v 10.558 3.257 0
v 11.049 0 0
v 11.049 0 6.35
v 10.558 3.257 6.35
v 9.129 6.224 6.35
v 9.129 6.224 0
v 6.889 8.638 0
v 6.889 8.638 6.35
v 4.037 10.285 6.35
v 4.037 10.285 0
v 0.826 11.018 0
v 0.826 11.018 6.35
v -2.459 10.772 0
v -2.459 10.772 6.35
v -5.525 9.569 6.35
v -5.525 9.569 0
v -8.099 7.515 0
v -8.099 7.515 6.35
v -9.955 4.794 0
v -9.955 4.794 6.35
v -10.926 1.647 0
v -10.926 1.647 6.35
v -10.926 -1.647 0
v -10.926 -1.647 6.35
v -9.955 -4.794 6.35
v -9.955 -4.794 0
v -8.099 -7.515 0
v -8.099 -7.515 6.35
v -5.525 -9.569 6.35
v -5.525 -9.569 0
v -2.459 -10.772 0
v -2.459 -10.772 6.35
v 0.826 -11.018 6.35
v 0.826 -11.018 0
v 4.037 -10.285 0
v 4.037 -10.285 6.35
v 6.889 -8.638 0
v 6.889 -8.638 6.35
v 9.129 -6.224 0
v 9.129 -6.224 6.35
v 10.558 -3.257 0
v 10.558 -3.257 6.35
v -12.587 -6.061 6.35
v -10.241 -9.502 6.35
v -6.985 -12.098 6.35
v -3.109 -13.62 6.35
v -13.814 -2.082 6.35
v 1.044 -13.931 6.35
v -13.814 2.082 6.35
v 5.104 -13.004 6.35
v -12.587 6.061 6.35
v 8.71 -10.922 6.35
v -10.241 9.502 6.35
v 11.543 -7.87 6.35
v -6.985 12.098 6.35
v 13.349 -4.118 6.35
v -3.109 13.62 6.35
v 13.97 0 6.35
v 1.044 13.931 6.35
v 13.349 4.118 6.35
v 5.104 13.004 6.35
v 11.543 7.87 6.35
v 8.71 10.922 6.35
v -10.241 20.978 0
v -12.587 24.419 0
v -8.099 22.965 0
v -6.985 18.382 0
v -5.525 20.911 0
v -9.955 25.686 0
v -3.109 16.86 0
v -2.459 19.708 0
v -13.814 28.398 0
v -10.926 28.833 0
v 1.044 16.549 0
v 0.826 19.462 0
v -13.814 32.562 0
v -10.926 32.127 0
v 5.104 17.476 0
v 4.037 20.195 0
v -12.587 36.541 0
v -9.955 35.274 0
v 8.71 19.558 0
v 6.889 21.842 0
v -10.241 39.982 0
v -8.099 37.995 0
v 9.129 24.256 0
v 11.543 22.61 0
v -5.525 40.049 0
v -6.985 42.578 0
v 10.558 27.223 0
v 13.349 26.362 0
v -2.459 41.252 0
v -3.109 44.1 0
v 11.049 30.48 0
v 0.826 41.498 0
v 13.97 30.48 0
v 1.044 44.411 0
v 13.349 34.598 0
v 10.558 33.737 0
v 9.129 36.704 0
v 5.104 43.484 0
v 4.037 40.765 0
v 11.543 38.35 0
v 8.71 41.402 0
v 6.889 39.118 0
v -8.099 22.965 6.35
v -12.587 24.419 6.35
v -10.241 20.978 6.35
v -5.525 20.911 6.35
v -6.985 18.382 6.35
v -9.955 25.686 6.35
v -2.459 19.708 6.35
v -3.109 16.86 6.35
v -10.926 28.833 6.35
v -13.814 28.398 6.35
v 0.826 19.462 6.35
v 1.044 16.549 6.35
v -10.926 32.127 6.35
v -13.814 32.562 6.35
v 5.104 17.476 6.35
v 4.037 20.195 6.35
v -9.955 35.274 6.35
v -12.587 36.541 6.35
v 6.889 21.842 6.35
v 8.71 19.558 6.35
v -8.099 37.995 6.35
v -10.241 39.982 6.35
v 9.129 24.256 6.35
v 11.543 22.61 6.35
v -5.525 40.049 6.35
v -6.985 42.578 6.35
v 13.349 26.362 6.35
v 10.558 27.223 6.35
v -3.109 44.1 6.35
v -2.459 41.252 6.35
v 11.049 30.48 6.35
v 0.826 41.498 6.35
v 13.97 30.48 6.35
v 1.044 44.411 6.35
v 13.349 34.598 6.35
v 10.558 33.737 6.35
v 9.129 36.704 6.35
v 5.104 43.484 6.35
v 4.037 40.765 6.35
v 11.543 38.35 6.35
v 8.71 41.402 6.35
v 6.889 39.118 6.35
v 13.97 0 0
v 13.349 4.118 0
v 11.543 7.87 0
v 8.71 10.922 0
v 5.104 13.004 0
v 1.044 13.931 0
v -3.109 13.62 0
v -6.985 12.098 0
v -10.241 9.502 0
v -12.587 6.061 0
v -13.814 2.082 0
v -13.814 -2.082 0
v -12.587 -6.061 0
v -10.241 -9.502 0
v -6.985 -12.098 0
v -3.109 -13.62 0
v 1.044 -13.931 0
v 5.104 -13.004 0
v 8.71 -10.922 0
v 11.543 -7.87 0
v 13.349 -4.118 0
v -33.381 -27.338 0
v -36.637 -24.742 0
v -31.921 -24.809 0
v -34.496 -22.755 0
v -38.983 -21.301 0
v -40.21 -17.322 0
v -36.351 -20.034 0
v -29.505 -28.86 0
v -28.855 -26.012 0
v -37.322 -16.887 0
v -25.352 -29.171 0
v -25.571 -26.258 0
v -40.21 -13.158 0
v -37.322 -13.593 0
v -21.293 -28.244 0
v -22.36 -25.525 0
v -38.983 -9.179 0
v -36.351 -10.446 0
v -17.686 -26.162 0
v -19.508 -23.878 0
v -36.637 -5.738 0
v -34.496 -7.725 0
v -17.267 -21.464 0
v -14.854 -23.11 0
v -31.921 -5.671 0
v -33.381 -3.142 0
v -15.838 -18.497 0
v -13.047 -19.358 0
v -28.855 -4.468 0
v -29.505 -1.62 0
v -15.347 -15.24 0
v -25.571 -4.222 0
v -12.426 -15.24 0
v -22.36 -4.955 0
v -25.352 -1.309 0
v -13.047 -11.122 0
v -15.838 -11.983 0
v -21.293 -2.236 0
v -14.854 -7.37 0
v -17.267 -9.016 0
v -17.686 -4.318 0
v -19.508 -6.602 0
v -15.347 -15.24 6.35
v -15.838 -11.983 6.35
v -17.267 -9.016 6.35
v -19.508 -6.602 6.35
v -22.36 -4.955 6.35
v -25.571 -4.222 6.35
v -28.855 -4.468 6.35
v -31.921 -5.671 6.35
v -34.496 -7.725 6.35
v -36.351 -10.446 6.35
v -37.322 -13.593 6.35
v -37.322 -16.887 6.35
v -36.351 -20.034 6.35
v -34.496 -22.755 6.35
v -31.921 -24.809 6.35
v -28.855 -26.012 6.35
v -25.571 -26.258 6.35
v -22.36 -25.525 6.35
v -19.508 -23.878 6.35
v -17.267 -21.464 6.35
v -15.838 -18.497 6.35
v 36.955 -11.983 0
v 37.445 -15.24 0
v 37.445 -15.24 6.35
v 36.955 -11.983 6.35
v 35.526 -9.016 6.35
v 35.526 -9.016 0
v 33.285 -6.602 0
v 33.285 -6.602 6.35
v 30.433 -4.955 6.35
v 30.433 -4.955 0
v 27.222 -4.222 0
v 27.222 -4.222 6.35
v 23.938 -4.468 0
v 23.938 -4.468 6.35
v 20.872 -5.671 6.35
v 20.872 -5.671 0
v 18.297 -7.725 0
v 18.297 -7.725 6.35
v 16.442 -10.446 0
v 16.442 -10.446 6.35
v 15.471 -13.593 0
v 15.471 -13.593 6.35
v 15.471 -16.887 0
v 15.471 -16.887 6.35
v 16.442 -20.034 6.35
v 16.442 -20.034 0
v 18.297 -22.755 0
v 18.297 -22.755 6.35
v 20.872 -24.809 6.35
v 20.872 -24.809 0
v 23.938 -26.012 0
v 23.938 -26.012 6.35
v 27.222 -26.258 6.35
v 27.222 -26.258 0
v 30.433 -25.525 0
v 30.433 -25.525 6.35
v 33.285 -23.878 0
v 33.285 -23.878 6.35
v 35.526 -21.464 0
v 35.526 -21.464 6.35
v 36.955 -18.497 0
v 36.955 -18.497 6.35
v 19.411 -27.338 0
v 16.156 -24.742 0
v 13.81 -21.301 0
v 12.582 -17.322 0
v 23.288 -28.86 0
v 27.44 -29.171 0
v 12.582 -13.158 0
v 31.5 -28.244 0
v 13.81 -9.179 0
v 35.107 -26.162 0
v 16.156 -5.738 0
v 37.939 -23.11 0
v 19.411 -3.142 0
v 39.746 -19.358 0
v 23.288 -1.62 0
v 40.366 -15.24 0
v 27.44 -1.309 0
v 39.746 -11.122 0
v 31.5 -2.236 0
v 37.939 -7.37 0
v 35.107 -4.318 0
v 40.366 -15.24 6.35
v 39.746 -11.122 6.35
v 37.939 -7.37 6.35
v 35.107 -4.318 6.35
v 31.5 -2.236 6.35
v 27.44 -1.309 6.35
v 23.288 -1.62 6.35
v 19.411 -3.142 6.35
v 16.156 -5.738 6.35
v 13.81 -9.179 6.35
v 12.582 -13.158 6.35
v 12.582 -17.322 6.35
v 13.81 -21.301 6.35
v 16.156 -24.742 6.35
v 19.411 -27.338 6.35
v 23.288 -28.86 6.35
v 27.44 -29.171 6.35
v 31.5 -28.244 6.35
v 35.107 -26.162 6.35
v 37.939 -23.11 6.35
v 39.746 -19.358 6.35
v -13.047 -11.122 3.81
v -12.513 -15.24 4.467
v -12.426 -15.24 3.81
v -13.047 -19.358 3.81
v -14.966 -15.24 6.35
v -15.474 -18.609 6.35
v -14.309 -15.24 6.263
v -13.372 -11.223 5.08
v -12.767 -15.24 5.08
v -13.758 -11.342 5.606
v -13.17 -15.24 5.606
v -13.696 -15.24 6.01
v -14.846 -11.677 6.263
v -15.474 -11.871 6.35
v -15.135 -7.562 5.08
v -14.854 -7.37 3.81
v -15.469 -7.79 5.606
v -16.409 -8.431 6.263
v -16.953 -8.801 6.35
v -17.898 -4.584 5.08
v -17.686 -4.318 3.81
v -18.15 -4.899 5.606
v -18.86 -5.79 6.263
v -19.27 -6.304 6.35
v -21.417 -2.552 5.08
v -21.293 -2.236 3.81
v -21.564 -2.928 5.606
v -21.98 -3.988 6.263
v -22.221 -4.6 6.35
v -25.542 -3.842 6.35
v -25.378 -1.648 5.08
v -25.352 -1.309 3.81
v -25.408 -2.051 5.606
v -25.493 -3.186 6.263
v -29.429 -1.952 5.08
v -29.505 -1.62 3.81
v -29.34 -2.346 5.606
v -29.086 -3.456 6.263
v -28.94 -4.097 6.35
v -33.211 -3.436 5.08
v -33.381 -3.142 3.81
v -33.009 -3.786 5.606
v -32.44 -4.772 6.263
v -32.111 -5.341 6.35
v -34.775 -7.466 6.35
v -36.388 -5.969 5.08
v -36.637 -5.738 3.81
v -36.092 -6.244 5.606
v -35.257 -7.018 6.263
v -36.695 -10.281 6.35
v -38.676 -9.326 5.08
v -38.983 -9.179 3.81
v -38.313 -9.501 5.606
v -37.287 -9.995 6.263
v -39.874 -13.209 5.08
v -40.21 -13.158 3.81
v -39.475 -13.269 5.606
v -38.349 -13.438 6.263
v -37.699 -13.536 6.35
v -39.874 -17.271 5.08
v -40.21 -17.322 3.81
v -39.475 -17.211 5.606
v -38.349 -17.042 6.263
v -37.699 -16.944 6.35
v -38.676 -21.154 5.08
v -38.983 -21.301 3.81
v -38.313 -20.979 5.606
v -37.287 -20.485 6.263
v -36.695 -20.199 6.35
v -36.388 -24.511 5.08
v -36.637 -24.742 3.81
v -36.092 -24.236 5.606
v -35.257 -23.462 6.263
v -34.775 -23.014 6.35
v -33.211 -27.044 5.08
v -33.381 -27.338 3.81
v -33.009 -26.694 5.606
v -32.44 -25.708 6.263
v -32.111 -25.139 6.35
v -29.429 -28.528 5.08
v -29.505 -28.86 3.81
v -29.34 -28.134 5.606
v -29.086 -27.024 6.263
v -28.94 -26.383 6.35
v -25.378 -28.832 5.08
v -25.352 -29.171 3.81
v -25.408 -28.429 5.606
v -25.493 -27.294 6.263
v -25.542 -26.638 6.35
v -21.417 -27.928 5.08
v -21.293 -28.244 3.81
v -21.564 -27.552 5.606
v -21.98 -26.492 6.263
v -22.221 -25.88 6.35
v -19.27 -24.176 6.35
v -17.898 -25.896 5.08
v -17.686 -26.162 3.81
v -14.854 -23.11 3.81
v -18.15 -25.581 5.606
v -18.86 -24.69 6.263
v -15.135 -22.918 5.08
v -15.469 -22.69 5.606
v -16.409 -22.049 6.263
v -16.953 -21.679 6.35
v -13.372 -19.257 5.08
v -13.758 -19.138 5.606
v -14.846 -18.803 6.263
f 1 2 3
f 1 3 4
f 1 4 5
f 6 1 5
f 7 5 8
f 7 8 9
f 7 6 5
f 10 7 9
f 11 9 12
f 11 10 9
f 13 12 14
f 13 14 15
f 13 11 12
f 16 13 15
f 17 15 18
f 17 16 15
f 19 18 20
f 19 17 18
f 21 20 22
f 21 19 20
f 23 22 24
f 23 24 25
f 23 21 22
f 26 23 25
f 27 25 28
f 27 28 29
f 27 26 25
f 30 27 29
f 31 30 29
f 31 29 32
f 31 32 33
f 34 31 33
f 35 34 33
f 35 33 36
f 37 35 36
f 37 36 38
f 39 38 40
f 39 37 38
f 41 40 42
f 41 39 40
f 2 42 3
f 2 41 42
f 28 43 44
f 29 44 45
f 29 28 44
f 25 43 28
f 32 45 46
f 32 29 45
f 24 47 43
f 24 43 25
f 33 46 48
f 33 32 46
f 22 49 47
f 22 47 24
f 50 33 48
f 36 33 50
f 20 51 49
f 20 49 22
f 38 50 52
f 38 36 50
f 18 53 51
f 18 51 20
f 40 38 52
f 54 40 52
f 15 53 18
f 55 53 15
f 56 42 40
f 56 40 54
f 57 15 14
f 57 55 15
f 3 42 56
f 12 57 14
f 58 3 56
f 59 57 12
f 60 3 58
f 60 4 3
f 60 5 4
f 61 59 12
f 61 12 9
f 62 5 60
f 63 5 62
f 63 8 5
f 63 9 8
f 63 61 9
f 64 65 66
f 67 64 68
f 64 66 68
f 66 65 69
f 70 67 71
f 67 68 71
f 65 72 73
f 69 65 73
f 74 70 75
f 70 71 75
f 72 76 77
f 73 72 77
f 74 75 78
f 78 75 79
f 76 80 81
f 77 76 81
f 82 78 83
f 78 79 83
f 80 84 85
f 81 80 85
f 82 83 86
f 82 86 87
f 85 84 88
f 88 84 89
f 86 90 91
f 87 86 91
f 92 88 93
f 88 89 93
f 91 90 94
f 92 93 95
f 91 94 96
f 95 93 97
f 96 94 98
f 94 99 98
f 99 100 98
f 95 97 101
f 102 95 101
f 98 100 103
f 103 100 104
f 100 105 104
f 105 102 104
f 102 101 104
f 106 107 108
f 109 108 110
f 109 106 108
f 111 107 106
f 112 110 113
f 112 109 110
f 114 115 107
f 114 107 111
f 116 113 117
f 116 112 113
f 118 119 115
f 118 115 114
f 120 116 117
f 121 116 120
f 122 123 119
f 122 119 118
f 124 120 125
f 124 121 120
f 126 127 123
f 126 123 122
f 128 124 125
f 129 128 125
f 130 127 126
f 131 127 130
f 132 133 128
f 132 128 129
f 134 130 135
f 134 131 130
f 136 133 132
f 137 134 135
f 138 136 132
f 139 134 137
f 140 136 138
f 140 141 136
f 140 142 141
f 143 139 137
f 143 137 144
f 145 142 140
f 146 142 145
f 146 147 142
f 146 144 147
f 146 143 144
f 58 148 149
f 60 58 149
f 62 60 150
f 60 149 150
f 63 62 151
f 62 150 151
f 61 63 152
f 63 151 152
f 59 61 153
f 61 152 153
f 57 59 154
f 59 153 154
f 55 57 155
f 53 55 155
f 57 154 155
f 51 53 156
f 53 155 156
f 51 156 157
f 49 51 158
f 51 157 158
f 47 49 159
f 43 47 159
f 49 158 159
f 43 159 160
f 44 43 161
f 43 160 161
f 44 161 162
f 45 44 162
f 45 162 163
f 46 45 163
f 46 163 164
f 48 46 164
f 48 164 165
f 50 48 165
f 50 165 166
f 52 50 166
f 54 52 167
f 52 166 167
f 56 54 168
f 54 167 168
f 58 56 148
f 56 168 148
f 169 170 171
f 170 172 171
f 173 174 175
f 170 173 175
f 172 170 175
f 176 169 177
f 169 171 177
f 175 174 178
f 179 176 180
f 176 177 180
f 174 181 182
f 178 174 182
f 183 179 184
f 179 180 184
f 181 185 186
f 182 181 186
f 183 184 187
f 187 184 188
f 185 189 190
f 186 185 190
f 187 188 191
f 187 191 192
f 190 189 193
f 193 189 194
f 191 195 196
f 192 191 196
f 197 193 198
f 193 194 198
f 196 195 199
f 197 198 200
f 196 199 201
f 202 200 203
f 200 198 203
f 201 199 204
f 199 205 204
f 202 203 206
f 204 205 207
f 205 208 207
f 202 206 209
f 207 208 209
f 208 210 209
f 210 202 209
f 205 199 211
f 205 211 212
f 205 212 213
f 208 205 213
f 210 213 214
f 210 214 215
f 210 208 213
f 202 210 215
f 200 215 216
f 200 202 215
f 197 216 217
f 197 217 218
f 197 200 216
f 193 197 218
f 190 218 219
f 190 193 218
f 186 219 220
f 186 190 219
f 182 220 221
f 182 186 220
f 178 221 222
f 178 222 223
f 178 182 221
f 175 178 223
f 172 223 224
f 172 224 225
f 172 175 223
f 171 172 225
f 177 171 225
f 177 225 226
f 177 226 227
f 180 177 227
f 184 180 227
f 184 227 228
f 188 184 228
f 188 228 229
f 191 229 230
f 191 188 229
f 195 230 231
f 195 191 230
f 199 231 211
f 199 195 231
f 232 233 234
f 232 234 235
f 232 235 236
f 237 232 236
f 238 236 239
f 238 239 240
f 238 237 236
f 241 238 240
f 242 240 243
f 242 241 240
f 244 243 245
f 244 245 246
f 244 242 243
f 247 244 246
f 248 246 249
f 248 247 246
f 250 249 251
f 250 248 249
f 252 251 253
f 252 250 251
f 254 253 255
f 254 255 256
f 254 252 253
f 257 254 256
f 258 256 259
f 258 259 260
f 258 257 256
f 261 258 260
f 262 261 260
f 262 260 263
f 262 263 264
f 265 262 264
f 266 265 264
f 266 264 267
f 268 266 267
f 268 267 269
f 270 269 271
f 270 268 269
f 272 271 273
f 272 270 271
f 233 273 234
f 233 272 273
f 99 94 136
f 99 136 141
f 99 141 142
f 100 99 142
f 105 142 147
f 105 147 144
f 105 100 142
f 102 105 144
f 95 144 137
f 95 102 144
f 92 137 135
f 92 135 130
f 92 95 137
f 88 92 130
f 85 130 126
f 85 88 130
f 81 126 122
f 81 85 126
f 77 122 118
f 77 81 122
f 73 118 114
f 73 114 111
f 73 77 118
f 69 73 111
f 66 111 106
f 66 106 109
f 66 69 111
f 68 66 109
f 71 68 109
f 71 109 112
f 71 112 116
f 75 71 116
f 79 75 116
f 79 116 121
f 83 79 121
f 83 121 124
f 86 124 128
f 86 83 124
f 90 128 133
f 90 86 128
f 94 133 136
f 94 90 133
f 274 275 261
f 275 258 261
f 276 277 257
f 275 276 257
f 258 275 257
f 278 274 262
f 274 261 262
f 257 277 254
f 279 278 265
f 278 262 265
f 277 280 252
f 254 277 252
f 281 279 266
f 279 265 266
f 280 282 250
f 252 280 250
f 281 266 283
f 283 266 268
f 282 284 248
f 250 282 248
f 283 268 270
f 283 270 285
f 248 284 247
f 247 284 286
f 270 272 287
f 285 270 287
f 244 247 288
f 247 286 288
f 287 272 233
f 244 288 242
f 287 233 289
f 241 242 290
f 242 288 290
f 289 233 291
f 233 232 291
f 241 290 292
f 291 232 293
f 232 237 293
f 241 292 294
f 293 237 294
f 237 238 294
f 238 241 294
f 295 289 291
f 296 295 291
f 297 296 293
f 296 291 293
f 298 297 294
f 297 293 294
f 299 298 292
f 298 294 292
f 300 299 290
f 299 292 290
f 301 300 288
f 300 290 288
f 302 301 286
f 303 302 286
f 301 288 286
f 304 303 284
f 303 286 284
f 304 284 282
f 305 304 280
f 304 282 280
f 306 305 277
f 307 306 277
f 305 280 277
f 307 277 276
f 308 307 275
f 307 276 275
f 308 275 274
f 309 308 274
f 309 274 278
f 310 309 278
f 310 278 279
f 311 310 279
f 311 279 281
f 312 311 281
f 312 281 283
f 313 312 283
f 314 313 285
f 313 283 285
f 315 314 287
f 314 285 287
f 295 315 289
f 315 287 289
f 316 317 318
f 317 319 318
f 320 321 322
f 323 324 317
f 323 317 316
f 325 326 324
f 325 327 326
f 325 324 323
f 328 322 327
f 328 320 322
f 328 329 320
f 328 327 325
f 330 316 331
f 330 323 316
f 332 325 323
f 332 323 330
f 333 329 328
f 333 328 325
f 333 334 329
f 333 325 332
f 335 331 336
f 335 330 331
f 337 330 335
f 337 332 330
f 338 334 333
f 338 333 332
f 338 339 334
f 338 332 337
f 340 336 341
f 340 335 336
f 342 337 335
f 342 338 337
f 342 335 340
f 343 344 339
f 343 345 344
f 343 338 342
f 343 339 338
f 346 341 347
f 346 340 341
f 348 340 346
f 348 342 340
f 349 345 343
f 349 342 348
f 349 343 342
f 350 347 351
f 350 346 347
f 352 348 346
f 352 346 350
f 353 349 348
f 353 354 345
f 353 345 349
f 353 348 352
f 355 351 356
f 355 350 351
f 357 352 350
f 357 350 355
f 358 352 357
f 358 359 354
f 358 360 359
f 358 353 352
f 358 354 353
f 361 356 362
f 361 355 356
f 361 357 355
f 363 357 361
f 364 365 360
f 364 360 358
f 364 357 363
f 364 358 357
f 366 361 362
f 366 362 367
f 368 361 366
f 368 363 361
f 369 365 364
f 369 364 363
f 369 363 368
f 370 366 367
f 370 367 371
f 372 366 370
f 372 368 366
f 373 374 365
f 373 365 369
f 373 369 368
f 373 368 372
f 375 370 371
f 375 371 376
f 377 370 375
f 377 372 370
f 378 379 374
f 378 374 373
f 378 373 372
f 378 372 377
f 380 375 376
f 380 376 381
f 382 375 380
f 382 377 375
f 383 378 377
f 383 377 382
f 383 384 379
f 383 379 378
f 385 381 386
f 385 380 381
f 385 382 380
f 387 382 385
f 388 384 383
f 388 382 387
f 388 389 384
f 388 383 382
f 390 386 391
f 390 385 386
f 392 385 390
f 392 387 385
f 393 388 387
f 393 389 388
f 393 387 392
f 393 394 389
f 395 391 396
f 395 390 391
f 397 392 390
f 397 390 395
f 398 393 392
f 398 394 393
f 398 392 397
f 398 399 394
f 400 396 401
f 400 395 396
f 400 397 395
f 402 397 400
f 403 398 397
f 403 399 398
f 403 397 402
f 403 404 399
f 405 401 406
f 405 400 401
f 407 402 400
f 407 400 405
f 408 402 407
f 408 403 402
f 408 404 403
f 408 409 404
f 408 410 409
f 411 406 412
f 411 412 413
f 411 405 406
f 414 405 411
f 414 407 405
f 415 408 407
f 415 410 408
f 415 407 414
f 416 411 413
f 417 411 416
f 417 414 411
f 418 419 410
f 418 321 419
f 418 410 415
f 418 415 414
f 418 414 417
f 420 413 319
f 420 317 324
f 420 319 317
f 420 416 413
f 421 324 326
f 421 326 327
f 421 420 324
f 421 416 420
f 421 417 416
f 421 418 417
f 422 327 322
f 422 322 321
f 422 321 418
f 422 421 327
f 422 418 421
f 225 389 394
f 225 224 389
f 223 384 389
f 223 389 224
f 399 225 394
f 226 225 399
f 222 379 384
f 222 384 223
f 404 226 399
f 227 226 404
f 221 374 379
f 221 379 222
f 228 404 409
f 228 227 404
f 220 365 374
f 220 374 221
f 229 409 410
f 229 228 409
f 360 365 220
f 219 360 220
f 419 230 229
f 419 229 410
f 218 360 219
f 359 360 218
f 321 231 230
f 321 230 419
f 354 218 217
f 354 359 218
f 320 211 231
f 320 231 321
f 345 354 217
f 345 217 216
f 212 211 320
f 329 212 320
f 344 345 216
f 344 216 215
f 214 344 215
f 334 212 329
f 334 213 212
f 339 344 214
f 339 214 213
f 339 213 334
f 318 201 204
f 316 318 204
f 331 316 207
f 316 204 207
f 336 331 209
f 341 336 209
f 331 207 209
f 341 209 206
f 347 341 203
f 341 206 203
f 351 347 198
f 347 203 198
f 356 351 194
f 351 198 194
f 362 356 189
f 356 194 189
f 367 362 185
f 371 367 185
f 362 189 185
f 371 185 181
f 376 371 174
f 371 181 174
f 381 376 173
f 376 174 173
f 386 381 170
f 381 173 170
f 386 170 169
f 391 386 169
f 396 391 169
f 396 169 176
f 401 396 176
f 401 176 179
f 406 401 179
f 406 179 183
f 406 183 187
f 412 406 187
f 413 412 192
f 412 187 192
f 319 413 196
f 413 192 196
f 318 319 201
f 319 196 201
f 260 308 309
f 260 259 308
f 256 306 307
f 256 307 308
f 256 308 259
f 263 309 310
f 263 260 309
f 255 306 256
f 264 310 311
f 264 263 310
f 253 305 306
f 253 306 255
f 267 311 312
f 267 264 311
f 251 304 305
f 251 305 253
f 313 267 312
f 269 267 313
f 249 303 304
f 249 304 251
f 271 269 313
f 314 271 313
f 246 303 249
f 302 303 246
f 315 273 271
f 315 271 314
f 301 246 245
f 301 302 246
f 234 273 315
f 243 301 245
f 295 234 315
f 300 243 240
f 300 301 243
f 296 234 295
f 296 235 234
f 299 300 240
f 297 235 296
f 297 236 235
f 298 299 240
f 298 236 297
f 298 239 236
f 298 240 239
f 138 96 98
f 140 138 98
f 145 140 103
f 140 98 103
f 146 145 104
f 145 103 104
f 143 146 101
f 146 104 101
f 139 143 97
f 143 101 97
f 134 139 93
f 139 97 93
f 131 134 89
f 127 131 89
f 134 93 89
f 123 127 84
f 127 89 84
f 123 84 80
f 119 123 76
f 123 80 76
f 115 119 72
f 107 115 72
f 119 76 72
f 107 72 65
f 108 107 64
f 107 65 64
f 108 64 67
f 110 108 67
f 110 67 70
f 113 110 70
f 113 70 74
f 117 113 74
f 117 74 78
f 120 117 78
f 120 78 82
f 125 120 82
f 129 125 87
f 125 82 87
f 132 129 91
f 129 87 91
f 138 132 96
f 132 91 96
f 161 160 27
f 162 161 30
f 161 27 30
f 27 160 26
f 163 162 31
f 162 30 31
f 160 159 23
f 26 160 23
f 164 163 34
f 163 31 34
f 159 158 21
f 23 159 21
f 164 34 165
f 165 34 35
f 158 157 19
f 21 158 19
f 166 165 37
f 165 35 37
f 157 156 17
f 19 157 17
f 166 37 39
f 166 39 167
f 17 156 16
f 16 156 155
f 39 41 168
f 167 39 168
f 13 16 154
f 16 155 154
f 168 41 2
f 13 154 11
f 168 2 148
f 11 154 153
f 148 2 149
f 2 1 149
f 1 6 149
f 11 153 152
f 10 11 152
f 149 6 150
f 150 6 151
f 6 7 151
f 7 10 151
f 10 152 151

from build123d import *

# Parameters (mm, degrees)
F0_R     = 13.97
F0_R_2   = 11.049
F2_DEPTH = 6.35
F4_R     = 2.54


# Not quite as in the source:
# - a feature of the source that left no trace in its solid (it failed there, or was rolled back) is left out


with BuildPart() as f2:
    # F0 (on Top) → F2 (new body)
    with BuildSketch(Plane.XY):
        with Locations((0, 30.48)):
            Circle(F0_R)
        with Locations((0, 30.48)):
            Circle(F0_R_2, mode=Mode.SUBTRACT)
    extrude(amount=F2_DEPTH)


with BuildPart() as f2b:
    # F0 (on Top) → F2, piece 2 (new body)
    with BuildSketch(Plane.XY):
        Circle(F0_R)
        Circle(F0_R_2, mode=Mode.SUBTRACT)
    extrude(amount=F2_DEPTH)


with BuildPart() as f2c:
    # F0 (on Top) → F2, piece 3 (new body)
    with BuildSketch(Plane.XY):
        with Locations((26.3964543073, -15.24)):
            Circle(F0_R)
        with Locations((26.3964543073, -15.24)):
            Circle(F0_R_2, mode=Mode.SUBTRACT)
    extrude(amount=F2_DEPTH)


with BuildPart() as f2d:
    # F0 (on Top) → F2, piece 4 (new body)
    with BuildSketch(Plane.XY):
        with Locations((-26.3964543073, -15.24)):
            Circle(F0_R)
        with Locations((-26.3964543073, -15.24)):
            Circle(F0_R_2, mode=Mode.SUBTRACT)
    extrude(amount=F2_DEPTH)

    # F4
    f4_edges = [f2d.edges().sort_by_distance(p)[0] for p in [
        (-40.366454, -15.24, 6.35),
    ]]
    fillet(f4_edges, radius=F4_R)


solid = Compound([f2.part, f2b.part, f2c.part, f2d.part])
